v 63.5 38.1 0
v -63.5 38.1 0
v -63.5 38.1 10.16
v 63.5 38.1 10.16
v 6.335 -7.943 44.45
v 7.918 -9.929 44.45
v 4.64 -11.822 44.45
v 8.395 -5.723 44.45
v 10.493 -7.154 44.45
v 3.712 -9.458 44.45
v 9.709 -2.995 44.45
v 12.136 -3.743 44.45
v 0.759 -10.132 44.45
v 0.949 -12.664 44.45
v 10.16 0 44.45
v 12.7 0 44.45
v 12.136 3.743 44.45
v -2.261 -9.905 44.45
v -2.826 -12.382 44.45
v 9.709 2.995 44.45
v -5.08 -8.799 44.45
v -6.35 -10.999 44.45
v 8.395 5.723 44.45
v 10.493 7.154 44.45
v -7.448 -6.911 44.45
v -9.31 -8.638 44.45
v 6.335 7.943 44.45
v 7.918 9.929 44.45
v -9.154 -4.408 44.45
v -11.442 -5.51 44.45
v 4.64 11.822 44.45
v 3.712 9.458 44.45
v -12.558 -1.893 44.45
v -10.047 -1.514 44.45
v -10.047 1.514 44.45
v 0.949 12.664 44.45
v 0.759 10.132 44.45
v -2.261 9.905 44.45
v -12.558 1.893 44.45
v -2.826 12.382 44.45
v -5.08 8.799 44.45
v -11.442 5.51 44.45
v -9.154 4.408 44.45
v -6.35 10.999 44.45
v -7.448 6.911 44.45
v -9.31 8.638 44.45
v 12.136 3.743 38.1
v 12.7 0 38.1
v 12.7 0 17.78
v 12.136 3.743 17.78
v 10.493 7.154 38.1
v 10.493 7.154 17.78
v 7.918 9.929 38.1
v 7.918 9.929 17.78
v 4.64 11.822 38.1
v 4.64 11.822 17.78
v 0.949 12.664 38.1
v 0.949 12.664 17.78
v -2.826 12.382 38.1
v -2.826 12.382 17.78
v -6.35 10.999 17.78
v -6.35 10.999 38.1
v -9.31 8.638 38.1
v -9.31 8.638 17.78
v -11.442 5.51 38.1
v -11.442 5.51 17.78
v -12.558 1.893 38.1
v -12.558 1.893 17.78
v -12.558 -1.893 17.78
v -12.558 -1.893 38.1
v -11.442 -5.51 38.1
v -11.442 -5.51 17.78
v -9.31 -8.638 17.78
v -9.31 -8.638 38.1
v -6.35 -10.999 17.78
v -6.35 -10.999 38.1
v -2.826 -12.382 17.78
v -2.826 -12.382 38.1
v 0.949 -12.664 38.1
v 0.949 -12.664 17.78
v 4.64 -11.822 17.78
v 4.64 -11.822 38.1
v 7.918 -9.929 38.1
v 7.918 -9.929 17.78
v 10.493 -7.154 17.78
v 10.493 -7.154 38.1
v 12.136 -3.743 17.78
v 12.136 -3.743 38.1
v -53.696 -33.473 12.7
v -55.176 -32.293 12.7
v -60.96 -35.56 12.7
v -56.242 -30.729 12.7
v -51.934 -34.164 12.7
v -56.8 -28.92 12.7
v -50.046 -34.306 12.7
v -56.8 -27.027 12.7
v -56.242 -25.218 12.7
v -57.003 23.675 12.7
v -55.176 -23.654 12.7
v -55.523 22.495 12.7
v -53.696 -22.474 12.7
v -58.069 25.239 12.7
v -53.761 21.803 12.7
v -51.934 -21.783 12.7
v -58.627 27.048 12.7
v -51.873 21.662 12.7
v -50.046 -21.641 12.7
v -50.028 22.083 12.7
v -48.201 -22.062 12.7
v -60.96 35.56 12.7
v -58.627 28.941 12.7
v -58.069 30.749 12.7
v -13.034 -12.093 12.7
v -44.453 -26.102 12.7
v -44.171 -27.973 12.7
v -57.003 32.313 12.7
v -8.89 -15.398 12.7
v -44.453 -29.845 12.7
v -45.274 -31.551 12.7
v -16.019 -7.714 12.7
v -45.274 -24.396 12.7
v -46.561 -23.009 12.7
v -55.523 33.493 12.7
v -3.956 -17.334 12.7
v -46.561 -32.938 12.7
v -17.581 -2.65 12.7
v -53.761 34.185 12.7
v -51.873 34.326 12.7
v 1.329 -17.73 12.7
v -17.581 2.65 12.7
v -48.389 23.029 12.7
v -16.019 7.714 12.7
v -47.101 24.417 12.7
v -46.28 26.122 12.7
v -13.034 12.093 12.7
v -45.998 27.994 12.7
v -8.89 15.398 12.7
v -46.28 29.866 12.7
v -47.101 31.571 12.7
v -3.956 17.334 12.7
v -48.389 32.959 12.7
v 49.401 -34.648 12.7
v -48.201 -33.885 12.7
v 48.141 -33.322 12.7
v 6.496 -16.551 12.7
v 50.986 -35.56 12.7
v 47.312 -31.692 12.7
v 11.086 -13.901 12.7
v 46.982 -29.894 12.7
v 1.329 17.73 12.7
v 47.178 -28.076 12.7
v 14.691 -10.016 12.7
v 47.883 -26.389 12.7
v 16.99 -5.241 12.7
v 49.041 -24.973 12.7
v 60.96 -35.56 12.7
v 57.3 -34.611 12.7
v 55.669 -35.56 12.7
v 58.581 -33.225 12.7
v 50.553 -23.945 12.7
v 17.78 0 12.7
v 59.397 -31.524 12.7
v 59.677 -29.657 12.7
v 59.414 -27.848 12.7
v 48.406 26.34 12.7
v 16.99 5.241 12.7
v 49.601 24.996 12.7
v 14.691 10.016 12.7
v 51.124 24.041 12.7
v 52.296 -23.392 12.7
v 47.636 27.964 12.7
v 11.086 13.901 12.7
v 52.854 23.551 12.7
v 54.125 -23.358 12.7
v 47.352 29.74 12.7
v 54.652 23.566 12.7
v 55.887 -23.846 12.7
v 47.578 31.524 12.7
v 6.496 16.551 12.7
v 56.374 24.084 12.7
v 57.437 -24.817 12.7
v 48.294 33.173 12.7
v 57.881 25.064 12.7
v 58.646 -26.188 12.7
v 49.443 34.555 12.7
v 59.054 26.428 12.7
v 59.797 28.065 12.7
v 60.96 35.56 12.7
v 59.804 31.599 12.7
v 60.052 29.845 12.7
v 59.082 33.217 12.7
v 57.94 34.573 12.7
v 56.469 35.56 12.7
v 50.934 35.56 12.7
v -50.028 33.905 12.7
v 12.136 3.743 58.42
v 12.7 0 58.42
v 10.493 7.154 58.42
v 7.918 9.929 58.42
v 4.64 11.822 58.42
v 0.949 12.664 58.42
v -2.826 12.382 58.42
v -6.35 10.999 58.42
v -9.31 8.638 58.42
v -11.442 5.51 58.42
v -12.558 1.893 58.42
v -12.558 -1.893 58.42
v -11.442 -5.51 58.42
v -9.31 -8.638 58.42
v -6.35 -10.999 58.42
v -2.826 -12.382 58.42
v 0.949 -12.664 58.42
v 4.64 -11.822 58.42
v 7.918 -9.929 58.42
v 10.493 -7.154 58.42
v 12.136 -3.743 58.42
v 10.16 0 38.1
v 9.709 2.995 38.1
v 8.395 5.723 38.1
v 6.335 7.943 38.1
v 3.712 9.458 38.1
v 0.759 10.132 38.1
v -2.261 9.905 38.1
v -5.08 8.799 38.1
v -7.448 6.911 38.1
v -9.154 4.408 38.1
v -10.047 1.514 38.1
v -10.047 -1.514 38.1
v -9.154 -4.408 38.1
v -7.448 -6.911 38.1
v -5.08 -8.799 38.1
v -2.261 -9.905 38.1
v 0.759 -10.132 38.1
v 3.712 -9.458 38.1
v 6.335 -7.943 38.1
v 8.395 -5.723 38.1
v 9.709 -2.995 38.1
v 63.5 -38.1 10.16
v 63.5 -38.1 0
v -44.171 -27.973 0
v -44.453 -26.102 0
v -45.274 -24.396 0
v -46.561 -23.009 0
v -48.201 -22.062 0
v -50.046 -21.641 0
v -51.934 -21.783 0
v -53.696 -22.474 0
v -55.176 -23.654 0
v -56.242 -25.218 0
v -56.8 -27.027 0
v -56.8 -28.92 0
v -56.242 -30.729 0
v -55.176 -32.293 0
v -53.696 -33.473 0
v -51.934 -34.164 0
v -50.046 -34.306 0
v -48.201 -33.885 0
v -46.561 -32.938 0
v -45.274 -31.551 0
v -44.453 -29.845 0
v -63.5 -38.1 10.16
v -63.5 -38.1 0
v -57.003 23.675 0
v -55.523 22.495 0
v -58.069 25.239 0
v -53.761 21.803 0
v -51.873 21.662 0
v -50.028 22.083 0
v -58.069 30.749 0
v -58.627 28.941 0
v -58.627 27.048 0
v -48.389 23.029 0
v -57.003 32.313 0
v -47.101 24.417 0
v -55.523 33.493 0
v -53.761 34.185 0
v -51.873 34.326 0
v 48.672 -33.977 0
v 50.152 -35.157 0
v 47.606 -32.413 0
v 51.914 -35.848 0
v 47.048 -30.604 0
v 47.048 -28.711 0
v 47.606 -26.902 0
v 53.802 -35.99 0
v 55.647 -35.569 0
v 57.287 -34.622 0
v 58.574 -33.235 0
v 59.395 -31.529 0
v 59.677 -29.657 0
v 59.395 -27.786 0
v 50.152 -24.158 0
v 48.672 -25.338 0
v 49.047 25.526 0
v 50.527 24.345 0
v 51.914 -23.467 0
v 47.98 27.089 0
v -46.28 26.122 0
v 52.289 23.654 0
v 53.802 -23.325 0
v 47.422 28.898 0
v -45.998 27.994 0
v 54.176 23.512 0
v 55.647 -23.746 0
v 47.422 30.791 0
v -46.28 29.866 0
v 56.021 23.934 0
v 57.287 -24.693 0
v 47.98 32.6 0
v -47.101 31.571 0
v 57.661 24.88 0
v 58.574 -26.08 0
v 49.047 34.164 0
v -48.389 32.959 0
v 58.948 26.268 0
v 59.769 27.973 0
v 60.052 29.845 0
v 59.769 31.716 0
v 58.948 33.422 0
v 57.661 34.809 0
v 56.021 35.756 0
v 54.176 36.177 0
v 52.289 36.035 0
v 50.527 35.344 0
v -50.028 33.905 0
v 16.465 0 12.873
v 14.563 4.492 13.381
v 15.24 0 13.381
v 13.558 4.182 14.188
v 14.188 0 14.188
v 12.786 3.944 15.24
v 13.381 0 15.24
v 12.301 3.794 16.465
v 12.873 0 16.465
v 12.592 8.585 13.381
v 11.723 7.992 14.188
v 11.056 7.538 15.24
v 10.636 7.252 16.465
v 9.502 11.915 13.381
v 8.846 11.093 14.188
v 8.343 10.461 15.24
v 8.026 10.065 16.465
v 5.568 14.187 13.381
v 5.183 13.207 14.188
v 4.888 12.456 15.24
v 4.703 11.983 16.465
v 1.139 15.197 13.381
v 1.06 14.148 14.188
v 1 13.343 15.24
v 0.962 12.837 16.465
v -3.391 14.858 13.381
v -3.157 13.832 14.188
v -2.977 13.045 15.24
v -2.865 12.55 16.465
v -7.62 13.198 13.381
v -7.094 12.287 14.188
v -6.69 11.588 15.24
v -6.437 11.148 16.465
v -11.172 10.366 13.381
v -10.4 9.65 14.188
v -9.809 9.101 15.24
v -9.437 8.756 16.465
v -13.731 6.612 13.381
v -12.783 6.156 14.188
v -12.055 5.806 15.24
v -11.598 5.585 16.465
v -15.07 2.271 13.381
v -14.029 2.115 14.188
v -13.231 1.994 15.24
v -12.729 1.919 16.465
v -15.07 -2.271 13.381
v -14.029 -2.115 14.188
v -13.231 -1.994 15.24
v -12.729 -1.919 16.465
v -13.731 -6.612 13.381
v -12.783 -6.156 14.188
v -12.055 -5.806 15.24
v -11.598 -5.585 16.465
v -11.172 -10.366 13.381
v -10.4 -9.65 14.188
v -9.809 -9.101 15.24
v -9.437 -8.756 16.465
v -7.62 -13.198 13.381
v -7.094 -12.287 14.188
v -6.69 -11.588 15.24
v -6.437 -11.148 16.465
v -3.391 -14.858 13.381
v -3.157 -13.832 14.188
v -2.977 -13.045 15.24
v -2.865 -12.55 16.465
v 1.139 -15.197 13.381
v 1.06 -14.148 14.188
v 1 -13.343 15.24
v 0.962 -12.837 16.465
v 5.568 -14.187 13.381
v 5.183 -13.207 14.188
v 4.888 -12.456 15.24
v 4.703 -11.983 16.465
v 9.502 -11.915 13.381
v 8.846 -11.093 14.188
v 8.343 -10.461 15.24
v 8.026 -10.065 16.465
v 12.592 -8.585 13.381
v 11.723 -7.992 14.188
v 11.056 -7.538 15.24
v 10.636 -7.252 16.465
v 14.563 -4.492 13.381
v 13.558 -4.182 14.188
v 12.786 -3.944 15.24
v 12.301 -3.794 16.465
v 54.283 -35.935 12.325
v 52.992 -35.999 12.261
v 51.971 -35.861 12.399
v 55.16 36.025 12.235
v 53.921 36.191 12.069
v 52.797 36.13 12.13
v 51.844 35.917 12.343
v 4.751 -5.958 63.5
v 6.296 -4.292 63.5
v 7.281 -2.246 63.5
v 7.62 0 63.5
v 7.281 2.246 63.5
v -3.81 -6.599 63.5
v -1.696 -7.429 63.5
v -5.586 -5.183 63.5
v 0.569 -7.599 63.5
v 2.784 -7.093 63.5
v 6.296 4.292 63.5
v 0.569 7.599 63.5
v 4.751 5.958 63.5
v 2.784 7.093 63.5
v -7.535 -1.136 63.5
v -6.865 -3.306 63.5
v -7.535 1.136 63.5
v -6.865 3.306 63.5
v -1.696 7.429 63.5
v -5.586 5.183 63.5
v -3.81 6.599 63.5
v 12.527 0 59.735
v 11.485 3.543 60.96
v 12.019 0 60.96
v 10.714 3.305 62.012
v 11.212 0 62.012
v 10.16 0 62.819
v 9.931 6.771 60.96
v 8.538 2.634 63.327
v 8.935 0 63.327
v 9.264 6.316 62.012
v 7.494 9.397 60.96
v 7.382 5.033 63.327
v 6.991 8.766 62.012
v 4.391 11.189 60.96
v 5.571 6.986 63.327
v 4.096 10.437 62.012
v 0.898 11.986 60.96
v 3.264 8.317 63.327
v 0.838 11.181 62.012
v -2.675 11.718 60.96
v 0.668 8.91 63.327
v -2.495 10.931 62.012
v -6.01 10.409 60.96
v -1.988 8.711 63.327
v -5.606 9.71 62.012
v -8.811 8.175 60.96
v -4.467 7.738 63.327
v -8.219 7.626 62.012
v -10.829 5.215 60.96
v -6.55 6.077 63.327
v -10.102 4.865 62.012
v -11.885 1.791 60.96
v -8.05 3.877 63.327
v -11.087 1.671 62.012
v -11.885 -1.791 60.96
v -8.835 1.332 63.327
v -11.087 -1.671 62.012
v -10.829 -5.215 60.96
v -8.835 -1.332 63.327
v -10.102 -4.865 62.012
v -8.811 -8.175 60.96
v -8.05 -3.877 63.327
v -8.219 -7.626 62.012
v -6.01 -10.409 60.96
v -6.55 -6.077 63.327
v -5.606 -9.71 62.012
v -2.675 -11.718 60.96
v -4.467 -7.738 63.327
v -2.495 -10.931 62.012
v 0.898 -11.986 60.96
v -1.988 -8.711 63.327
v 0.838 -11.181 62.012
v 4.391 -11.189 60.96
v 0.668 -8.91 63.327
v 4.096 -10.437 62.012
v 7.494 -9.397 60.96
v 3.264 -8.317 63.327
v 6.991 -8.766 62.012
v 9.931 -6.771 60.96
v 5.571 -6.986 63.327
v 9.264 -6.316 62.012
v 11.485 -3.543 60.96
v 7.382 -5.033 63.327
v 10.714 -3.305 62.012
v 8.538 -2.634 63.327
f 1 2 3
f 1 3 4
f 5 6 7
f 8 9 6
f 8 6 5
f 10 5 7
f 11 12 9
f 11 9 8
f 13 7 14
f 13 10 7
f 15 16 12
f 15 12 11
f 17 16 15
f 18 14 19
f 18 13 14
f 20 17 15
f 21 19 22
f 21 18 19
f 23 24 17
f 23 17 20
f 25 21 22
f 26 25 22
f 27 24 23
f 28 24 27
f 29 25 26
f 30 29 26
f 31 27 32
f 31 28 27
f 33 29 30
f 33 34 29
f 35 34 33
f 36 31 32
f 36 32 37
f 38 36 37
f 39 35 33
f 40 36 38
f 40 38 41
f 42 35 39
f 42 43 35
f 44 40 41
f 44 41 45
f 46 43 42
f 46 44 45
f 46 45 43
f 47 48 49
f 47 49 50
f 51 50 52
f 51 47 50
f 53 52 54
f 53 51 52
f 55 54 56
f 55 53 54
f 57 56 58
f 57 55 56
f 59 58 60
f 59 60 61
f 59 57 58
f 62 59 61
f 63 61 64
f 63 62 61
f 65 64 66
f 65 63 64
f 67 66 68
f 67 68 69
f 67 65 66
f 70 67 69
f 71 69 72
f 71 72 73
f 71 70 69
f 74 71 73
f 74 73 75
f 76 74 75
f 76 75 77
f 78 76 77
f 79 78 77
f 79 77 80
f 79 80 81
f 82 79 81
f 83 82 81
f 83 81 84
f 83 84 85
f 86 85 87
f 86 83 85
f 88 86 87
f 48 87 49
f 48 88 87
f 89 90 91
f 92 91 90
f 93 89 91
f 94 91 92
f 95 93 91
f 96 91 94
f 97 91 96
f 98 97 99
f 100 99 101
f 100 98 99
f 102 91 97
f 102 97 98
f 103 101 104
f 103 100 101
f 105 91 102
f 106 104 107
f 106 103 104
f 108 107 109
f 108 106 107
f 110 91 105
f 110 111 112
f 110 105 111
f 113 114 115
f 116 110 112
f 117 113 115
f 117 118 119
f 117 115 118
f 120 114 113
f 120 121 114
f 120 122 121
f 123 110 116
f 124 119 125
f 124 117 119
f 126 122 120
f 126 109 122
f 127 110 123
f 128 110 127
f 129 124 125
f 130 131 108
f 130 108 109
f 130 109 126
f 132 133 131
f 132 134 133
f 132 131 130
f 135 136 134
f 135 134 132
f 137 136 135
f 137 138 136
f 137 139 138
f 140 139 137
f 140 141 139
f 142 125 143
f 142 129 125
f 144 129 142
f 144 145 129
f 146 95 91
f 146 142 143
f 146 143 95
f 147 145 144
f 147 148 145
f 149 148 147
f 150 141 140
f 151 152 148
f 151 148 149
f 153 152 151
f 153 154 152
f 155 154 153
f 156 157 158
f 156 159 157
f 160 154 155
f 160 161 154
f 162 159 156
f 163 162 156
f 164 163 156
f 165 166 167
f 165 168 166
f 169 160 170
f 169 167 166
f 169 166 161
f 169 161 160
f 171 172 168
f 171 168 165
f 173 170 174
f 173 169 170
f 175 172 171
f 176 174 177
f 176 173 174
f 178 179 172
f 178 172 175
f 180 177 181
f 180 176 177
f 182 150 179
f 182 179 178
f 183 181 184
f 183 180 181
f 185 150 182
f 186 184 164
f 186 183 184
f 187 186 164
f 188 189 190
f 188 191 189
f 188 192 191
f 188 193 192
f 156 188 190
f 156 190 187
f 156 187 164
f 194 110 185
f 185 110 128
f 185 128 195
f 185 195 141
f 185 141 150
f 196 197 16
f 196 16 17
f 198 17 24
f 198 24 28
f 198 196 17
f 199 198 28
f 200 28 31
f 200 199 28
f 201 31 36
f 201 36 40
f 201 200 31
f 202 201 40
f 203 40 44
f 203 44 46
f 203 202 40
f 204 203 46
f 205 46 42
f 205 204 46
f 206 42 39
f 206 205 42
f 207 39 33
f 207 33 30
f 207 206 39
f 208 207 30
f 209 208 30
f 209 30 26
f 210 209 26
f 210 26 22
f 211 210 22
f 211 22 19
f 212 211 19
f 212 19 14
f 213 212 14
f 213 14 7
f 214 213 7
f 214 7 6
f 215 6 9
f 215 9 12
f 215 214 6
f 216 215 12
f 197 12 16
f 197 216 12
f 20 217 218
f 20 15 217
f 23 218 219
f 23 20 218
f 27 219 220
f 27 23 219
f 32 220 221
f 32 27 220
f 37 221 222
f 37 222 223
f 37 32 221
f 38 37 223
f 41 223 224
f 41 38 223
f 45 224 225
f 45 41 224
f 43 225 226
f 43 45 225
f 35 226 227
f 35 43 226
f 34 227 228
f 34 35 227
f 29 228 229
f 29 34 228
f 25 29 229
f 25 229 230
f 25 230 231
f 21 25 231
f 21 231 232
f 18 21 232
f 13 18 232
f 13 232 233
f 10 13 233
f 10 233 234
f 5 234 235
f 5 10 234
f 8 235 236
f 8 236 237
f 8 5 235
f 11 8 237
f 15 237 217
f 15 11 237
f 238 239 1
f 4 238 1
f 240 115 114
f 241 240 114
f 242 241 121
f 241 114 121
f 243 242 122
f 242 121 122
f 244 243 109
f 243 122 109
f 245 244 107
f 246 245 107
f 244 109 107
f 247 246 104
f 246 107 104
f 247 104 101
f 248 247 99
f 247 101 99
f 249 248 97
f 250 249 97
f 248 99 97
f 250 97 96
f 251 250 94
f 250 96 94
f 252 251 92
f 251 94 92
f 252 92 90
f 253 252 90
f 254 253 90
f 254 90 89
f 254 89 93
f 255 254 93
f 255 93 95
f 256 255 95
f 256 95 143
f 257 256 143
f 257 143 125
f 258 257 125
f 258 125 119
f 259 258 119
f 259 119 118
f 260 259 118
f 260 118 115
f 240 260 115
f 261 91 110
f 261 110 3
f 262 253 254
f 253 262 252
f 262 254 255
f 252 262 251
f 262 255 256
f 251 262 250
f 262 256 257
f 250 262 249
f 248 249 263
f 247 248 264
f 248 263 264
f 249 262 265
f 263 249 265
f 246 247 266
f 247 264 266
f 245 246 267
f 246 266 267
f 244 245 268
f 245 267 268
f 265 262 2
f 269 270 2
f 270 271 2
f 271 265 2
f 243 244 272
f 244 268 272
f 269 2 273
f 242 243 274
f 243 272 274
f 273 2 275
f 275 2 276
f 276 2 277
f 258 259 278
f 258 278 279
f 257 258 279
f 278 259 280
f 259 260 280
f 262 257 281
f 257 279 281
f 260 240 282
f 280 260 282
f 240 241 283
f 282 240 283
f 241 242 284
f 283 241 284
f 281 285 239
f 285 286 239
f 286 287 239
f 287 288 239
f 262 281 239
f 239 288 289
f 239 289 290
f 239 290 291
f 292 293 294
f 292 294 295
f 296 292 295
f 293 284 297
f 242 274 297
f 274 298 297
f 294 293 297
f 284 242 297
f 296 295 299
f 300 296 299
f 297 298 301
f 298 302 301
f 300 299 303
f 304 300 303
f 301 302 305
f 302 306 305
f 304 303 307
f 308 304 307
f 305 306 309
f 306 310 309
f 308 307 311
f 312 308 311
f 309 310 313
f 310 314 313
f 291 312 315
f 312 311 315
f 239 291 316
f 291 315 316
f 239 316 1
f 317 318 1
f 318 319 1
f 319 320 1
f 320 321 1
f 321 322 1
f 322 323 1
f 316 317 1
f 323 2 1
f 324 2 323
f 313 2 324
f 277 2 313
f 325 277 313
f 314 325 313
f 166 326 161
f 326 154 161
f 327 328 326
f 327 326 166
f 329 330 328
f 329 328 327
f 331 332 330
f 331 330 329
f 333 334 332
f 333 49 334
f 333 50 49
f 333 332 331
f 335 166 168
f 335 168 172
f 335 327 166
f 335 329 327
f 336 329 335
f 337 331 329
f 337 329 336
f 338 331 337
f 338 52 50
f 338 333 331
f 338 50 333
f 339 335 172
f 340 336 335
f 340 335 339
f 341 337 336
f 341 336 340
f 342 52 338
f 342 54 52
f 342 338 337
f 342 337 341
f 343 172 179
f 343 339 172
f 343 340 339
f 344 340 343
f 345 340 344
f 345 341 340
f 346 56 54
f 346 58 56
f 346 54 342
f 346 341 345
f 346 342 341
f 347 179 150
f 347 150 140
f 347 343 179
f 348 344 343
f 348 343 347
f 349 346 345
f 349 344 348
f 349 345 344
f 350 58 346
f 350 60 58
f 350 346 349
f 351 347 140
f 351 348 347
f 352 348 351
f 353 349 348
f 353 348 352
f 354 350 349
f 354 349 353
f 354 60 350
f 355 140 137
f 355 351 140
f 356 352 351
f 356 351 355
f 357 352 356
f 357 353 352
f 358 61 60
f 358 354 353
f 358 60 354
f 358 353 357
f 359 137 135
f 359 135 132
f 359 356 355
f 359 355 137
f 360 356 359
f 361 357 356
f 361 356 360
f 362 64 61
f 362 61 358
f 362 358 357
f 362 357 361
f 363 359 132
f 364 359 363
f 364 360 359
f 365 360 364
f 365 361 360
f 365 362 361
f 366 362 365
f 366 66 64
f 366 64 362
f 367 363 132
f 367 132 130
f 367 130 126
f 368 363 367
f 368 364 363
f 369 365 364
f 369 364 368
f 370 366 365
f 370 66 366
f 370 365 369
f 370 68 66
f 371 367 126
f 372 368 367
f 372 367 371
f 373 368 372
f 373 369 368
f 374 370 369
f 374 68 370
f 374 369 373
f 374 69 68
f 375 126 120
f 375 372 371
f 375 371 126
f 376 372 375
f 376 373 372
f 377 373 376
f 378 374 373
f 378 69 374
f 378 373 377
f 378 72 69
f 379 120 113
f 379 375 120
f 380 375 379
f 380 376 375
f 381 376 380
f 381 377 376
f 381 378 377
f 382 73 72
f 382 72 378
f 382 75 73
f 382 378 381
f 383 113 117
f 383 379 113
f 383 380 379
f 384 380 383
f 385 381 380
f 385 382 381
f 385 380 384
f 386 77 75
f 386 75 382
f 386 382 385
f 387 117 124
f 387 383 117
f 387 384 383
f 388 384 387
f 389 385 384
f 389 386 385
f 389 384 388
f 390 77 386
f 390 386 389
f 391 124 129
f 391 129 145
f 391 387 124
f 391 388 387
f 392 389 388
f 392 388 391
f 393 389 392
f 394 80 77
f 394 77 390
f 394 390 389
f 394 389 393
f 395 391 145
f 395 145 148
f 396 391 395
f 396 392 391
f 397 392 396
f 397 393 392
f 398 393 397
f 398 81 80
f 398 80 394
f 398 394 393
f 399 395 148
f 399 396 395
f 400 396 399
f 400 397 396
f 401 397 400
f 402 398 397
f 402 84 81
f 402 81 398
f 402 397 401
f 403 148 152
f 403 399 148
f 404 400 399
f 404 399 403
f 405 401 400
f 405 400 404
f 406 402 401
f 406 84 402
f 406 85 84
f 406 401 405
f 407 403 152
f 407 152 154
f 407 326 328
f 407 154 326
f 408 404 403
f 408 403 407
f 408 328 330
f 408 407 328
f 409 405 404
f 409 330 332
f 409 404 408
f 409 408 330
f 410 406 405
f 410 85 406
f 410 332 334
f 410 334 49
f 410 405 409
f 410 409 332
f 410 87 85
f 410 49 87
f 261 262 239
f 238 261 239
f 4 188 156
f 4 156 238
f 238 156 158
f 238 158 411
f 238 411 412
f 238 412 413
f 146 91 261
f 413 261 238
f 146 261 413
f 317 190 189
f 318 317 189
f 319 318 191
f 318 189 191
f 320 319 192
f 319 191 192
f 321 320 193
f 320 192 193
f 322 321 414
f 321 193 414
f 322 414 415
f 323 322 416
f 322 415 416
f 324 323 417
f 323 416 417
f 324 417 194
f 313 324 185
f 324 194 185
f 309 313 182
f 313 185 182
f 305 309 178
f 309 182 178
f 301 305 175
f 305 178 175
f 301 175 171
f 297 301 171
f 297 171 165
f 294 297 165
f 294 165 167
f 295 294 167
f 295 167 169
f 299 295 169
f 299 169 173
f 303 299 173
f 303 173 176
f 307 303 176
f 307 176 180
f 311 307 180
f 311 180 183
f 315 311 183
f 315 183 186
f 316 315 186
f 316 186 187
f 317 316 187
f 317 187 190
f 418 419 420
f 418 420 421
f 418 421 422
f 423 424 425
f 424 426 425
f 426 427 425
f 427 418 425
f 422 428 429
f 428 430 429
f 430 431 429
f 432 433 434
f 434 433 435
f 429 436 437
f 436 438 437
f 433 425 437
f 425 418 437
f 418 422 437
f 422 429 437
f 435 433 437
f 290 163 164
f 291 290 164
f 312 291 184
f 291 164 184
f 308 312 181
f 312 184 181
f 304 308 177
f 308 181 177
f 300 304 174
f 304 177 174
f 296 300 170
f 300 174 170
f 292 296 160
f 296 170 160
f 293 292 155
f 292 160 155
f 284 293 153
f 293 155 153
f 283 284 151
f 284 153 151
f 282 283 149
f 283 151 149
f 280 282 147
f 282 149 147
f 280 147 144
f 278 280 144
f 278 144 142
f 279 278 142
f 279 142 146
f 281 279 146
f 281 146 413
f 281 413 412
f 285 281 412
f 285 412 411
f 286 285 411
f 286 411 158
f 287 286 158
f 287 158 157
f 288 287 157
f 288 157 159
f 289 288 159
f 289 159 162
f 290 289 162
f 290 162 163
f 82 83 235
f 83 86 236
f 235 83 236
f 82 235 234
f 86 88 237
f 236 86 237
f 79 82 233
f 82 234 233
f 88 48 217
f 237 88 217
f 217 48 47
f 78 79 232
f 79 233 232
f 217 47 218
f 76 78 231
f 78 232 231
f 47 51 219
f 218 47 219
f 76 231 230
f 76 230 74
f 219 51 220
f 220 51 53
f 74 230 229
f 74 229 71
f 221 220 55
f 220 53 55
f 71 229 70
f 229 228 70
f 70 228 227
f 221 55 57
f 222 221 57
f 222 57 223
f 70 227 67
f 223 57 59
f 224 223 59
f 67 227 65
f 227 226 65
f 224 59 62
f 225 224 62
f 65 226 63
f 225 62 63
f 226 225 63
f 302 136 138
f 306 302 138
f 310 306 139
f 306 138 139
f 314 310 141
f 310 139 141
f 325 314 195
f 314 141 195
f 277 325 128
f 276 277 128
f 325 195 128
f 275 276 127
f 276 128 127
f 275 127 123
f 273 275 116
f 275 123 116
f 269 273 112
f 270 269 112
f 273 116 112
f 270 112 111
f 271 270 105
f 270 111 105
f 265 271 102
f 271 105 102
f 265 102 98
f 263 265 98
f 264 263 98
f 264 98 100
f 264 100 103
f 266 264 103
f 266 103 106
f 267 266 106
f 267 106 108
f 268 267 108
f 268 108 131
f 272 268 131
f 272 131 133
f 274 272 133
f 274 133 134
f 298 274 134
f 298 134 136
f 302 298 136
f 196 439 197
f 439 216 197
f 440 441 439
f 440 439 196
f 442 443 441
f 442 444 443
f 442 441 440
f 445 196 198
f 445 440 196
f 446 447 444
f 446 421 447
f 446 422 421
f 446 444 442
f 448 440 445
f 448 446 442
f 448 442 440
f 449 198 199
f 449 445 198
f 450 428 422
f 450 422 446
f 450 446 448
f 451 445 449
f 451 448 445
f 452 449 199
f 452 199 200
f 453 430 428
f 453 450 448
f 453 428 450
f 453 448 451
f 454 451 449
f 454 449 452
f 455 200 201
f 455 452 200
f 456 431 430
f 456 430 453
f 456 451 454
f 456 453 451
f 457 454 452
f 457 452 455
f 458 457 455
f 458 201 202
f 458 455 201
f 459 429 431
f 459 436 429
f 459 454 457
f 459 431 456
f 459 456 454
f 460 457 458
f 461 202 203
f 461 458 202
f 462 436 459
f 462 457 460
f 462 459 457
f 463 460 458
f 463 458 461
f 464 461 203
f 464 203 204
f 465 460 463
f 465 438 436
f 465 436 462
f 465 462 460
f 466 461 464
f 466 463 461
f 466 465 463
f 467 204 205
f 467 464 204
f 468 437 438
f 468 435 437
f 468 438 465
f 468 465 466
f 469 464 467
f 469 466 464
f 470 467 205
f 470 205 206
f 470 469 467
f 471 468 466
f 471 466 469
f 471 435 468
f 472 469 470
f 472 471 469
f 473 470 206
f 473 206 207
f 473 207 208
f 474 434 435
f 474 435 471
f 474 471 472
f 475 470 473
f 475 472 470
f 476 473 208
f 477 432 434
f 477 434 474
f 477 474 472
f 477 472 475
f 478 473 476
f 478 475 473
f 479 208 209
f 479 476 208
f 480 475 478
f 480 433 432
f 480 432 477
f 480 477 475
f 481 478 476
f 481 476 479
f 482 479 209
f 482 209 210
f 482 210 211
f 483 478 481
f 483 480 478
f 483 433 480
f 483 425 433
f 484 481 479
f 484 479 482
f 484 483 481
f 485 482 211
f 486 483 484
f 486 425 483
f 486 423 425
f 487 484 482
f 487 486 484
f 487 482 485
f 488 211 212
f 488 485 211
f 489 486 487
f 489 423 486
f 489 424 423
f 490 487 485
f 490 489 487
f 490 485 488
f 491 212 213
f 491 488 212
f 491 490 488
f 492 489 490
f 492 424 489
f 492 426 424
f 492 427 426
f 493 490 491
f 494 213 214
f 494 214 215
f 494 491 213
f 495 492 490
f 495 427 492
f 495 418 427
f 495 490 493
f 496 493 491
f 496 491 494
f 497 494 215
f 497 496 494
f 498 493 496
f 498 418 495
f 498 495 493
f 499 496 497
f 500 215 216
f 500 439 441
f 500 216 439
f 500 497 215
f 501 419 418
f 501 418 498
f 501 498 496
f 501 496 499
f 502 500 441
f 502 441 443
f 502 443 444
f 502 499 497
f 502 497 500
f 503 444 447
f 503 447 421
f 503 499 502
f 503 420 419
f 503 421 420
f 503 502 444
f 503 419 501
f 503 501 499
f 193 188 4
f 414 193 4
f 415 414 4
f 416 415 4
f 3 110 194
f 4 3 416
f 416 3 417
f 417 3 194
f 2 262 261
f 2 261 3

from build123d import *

# Parameters (mm, degrees)
F0_W        = 127
F0_H        = 76.2
F1_DEPTH    = 12.7
F2_R        = 6.35
F3_DEPTH    = 12.701
F4_W        = 12.7
F4_H        = 50.8
F6_W        = 13.0245922636
F6_H        = 6.35
F8_R        = 5.08
F9_T1_DEPTH = 140.0641495789
F9_T3_DEPTH = 89.2641495789


# Not quite as in the source:
# - a fillet or chamfer that OpenCascade refuses, or shapes differently, is made with other operations: its cross-section is extruded or revolved along the edge and cut away or added


with BuildPart() as f1:
    # F0 (on Top) → F1 (new body)
    with BuildSketch(Plane.XY):
        Rectangle(F0_W, F0_H)
    extrude(amount=F1_DEPTH)

    # F2 (on face) → F3 (cut, through all)
    with BuildSketch(Plane.XY.offset(12.7)):
        with Locations((-52.3479245603, 27.9940944165)):
            Circle(F2_R)
        with Locations((53.7015721202, 29.8446007073)):
            Circle(F2_R)
        with Locations((-50.5206361413, -27.9734656215)):
            Circle(F2_R)
        with Locations((53.327344358, -29.6574886888)):
            Circle(F2_R)
    extrude(amount=-F3_DEPTH, mode=Mode.SUBTRACT)

    # F4 (on Front) → F5 (revolve)
    with BuildSketch(Plane.XZ):
        with Locations((6.35, 38.1)):
            Rectangle(F4_W, F4_H)
    revolve(axis=Axis((0, 0, 38.1), (0, 0, 1)))

    # F6 (on Front) → F7 (revolve, cut)
    with BuildSketch(Plane.XZ):
        with Locations((16.6722961318, 41.275)):
            Rectangle(F6_W, F6_H)
    revolve(axis=Axis((0, 0, 38.1), (0, 0, 1)), mode=Mode.SUBTRACT)

    # F8
    f8_edges = [f1.edges().sort_by_distance(p)[0] for p in [
        (-12.7, 0, 63.5),
        (-12.7, 0, 12.7),
    ]]
    fillet(f8_edges, radius=F8_R)

    # F9: chamfer of 2.54 on 4 edges, made by hand

    # F9_s2 → F9_t1 (cut)
    with BuildSketch(Plane.YZ.offset(-70.0320747894)):
        Polygon((-35.56, 12.7), (-38.1, 10.16), (-38.1, 12.7), align=None)
        Polygon((35.56, 12.7), (38.1, 10.16), (38.1, 12.7), align=None)
    extrude(amount=F9_T1_DEPTH, mode=Mode.SUBTRACT)

    # F9_s4 → F9_t3 (cut)
    with BuildSketch(Plane.XZ.offset(-44.6320747894)):
        Polygon((60.96, 12.7), (63.5, 10.16), (63.5, 12.7), align=None)
        Polygon((-60.96, 12.7), (-63.5, 10.16), (-63.5, 12.7), align=None)
    extrude(amount=F9_T3_DEPTH, mode=Mode.SUBTRACT)


solid = f1.part
